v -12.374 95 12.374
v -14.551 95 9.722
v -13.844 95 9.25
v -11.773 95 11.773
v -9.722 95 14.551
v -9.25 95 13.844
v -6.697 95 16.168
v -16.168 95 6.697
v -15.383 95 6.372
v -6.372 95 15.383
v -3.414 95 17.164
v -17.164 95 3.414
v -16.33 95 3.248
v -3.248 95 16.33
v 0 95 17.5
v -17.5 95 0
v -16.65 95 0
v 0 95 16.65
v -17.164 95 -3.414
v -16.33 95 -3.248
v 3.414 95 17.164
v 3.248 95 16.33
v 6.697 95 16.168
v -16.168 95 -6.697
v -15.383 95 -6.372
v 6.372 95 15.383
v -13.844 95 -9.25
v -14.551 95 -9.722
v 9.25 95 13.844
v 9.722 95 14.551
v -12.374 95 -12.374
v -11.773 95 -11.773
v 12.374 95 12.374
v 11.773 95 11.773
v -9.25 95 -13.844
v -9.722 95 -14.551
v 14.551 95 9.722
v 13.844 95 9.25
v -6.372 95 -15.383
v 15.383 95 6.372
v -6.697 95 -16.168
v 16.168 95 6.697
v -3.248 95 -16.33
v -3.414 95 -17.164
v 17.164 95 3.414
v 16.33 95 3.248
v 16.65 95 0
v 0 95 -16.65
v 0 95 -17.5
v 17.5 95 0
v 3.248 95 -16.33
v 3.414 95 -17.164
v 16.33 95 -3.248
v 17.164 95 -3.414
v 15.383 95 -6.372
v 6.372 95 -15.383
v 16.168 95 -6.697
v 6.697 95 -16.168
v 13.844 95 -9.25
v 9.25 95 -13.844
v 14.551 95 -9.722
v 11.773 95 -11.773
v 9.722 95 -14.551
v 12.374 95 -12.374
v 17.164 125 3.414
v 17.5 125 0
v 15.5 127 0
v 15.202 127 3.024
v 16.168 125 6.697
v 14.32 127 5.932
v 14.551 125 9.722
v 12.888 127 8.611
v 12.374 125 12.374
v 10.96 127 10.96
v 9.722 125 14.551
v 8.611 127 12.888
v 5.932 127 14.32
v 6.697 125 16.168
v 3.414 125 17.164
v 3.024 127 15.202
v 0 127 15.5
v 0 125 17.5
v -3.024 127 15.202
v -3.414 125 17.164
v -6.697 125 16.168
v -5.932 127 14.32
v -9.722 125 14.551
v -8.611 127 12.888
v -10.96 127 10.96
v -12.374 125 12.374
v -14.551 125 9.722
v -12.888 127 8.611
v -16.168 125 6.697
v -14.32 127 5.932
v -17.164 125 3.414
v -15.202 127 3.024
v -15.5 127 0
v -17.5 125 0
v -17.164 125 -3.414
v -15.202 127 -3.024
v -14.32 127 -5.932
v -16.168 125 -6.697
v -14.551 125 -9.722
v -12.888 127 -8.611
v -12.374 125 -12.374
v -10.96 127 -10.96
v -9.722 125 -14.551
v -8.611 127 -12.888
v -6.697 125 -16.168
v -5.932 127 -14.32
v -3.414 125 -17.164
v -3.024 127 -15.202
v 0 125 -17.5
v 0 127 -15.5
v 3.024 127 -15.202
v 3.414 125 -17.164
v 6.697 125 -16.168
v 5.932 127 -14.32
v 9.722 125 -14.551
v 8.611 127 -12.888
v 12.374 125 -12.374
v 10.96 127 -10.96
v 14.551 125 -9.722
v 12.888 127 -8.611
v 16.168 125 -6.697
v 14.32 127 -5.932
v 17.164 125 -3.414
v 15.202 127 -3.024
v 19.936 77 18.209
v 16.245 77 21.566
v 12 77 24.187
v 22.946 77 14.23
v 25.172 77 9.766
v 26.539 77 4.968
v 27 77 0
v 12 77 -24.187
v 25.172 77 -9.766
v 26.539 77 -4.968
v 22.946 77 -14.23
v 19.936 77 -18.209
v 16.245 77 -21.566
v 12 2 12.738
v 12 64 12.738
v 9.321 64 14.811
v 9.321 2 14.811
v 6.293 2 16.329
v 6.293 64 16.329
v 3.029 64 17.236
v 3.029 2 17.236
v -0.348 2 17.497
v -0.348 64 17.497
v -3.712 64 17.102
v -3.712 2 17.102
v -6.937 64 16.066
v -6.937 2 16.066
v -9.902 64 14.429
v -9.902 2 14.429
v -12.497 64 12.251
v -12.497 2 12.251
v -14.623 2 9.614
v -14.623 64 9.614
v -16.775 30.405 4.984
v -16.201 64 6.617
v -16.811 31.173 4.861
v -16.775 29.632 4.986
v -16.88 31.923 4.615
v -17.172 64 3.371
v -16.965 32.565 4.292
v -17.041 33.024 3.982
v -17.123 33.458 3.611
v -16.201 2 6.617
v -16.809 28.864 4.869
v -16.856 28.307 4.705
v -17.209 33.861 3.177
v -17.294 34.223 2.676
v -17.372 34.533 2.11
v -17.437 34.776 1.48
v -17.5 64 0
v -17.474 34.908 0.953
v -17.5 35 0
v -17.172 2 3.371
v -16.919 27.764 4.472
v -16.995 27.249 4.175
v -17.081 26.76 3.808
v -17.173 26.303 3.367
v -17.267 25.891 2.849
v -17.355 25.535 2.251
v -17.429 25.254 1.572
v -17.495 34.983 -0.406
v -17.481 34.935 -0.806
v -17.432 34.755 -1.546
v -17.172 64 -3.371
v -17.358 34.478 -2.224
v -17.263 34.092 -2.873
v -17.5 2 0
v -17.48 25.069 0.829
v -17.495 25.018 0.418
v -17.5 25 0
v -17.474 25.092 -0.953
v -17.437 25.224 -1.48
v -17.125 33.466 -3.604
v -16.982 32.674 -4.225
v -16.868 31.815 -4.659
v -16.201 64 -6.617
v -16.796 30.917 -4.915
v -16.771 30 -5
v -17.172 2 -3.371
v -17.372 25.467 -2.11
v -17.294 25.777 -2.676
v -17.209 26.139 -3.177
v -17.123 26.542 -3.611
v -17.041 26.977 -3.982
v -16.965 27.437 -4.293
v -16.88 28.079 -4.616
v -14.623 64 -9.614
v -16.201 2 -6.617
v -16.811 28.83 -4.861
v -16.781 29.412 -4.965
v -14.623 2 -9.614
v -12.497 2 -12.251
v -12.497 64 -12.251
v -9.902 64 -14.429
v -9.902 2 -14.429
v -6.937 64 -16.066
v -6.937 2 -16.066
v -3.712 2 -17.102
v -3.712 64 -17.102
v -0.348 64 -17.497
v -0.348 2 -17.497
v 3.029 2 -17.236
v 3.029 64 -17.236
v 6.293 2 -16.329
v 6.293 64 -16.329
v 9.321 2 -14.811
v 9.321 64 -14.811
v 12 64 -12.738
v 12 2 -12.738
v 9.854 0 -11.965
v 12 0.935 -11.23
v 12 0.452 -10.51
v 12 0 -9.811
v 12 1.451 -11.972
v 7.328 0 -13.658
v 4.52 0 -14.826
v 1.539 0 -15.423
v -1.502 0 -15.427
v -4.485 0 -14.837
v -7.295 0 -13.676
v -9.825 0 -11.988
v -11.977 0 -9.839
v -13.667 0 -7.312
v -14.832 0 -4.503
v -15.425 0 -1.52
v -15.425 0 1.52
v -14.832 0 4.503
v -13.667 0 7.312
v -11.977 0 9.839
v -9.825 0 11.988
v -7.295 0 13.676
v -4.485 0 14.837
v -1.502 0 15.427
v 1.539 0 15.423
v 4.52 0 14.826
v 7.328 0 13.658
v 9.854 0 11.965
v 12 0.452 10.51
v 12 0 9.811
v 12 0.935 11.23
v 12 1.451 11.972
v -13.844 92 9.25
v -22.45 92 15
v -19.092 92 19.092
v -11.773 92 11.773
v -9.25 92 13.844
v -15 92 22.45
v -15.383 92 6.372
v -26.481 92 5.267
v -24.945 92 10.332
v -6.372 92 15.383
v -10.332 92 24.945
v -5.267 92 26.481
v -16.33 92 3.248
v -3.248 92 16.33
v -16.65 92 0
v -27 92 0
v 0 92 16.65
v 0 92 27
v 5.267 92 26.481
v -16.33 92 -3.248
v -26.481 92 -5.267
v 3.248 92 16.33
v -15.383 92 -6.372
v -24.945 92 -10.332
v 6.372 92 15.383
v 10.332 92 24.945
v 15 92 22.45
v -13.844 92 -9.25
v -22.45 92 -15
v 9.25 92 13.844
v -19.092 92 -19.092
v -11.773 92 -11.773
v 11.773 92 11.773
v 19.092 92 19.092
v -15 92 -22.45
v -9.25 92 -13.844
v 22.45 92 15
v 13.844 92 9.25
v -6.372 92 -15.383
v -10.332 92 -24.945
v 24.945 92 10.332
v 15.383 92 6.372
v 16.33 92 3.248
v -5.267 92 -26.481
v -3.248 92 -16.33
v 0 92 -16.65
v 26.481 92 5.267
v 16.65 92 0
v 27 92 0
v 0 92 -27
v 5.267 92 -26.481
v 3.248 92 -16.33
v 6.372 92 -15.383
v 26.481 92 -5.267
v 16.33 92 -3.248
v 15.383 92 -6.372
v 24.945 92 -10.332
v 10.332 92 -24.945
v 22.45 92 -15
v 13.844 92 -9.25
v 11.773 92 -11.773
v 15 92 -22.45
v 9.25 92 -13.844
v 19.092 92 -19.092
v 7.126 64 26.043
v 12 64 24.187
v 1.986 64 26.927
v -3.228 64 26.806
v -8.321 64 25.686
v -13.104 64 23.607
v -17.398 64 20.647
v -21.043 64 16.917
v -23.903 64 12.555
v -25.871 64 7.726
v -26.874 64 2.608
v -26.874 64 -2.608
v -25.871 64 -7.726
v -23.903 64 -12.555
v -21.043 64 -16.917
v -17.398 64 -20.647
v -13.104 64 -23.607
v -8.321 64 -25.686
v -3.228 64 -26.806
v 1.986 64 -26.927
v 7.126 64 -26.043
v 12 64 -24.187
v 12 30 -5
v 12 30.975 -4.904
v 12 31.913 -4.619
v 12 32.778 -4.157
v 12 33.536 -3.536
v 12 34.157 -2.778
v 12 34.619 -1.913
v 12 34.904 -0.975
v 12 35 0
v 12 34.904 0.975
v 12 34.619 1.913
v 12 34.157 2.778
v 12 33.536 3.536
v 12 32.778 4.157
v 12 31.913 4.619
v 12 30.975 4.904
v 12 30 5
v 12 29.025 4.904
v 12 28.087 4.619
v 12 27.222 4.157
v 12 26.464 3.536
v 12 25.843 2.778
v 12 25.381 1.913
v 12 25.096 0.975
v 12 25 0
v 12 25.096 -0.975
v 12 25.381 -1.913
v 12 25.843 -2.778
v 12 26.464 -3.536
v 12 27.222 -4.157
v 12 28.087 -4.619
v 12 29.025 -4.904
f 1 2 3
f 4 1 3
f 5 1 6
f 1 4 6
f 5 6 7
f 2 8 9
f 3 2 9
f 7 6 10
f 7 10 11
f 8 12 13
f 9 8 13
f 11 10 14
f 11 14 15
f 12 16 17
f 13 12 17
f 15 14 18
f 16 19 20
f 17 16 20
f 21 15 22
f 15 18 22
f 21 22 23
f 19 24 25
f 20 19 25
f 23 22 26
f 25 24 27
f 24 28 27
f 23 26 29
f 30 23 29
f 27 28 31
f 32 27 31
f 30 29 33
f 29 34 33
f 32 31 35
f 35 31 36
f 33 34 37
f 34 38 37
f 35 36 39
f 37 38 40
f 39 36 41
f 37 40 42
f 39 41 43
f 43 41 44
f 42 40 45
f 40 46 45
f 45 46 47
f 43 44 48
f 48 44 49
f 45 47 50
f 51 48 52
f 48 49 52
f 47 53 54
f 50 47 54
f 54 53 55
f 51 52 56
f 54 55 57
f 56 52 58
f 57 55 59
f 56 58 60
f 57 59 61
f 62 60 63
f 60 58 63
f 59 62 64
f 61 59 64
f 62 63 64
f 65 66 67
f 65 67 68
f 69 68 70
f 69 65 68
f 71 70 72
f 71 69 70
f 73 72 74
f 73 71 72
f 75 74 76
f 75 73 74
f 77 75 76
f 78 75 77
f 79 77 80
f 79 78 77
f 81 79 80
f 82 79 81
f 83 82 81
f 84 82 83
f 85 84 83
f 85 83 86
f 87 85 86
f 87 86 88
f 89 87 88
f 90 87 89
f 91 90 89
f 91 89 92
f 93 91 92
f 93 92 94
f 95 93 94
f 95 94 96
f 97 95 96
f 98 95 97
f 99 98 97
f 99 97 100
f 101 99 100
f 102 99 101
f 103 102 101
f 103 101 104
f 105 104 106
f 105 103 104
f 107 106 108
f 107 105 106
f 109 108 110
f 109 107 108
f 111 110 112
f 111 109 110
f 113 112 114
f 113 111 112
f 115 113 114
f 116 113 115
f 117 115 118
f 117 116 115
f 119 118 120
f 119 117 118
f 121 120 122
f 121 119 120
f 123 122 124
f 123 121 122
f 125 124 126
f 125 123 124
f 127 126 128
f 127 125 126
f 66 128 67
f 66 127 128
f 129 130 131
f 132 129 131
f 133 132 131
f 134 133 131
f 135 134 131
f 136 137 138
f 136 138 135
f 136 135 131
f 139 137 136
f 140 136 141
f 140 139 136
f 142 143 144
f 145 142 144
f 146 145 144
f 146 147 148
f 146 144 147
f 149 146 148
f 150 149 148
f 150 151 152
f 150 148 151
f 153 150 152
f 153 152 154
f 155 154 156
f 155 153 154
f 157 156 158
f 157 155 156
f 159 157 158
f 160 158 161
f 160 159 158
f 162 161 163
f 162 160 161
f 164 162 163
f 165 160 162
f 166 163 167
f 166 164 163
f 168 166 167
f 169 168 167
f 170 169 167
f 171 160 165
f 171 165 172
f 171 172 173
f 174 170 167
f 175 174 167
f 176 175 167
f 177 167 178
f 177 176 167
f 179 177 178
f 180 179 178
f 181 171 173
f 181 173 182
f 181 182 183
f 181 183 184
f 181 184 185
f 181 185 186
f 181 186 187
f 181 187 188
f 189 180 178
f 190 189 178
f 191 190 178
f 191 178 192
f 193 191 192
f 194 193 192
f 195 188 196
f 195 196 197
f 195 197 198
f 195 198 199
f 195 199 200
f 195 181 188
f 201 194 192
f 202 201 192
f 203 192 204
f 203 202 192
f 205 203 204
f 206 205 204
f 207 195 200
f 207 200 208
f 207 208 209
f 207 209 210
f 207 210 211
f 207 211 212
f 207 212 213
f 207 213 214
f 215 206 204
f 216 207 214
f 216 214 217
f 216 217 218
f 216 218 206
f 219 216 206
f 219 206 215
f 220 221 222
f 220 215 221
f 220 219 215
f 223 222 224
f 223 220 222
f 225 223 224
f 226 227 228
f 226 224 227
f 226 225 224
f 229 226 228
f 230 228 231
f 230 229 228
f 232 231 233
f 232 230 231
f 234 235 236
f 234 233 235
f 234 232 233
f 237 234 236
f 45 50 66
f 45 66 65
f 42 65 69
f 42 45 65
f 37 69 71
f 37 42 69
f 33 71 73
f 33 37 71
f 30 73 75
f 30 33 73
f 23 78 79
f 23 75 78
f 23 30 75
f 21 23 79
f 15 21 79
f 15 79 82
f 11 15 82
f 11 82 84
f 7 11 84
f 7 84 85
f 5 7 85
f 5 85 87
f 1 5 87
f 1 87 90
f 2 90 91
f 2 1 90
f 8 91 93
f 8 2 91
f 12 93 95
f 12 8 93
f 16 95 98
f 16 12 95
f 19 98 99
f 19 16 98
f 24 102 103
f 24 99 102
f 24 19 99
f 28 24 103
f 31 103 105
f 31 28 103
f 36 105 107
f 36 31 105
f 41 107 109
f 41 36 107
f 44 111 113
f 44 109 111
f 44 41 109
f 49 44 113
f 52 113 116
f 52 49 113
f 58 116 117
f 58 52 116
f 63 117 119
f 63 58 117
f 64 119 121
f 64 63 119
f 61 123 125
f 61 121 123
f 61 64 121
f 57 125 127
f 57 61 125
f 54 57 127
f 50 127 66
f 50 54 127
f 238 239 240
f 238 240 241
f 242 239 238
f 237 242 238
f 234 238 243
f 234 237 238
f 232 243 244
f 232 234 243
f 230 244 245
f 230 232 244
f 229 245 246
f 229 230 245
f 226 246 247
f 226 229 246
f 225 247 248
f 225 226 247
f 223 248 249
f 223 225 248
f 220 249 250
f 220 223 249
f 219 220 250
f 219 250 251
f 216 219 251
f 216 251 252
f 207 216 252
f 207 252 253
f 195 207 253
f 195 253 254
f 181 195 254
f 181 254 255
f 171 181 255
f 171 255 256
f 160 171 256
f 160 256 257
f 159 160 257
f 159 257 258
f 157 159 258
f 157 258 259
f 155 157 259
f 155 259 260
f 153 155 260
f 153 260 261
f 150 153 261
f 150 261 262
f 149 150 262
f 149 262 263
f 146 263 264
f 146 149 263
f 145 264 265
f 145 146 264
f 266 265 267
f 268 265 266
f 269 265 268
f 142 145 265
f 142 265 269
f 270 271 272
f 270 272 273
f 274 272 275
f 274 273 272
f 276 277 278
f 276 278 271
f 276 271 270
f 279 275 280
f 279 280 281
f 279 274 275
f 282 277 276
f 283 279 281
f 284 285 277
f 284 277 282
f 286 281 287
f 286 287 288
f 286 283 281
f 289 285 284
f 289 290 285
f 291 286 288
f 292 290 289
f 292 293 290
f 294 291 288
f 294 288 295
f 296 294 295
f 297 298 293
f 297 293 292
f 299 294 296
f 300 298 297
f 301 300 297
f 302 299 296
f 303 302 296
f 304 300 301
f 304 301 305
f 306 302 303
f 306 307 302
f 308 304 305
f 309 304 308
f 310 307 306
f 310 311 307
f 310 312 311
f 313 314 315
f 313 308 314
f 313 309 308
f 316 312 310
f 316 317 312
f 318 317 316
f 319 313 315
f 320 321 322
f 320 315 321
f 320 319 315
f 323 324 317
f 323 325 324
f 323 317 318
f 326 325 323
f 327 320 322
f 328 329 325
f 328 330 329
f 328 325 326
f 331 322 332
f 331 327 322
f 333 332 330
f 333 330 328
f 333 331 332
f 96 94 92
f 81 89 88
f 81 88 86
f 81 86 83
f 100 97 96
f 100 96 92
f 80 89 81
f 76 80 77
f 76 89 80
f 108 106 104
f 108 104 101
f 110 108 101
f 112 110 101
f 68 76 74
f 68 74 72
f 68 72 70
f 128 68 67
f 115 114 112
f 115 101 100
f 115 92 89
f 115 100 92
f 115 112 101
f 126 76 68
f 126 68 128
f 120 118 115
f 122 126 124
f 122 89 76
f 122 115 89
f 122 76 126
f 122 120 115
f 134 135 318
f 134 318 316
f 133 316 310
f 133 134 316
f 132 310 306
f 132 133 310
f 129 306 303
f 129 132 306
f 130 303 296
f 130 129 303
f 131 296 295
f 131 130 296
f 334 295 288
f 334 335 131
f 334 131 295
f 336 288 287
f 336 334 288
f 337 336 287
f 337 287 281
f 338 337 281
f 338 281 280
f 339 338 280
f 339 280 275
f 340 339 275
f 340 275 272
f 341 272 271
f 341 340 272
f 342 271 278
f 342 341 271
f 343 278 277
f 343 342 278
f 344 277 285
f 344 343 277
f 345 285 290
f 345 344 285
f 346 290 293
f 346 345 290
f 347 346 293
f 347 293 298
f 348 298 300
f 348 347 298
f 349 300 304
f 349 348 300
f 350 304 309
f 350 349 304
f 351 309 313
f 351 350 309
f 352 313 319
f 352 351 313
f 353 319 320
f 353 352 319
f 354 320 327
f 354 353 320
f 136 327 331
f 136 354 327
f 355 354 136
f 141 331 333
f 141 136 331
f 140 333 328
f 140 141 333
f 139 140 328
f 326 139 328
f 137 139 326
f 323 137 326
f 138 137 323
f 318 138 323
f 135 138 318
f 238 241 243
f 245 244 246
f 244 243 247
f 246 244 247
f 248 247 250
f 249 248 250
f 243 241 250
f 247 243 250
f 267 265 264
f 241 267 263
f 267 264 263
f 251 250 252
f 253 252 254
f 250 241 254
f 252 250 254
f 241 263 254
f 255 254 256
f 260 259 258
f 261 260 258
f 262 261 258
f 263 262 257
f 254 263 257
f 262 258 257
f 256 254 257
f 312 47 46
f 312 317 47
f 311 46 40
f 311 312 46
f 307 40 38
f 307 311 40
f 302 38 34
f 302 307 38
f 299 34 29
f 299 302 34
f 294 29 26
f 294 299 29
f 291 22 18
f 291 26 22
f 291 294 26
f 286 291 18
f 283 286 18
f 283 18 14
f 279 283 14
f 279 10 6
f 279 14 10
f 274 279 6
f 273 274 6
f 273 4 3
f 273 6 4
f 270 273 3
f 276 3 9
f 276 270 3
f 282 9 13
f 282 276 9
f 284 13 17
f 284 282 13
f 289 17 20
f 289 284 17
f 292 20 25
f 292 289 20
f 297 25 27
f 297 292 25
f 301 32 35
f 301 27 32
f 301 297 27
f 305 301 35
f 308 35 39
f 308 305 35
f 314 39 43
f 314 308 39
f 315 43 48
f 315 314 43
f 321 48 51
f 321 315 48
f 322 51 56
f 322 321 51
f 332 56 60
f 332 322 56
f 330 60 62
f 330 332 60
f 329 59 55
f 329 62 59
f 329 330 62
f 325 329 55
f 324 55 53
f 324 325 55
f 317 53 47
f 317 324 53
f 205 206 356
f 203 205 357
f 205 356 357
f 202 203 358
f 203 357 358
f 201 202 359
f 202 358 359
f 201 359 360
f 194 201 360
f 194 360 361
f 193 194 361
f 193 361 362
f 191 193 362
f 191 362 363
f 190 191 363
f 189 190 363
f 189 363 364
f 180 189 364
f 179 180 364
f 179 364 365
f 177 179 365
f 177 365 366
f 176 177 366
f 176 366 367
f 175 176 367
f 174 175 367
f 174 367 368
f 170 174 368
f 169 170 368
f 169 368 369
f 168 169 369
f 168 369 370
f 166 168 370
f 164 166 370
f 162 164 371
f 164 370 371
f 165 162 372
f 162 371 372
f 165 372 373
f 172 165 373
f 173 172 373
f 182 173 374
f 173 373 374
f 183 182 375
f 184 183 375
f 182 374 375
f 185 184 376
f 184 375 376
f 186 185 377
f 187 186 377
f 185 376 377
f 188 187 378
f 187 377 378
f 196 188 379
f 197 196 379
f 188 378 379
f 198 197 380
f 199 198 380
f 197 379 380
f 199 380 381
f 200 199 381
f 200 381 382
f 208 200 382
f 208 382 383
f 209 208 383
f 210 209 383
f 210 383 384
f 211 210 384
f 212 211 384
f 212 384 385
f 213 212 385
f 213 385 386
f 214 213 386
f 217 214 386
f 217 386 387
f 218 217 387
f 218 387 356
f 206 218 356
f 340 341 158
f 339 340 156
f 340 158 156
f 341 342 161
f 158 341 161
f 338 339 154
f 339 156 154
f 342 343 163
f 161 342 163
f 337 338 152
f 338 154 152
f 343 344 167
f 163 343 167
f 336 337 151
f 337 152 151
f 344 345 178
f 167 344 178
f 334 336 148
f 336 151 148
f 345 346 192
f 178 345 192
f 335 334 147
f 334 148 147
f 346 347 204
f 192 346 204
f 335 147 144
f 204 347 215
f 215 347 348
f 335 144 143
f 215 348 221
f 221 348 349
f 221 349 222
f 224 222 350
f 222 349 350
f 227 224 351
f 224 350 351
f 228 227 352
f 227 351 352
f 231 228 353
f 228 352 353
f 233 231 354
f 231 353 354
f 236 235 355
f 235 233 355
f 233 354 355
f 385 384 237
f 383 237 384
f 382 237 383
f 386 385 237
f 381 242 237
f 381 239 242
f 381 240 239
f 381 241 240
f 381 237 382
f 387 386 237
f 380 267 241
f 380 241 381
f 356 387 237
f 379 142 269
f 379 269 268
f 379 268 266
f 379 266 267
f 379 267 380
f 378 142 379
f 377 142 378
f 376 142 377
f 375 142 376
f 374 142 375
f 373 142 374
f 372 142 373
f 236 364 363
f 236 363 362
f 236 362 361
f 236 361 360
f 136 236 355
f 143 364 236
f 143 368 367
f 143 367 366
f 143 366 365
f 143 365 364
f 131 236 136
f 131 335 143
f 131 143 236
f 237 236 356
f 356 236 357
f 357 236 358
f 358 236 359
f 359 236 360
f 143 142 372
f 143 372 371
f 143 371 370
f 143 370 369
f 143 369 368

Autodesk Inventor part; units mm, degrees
ref_plane "XZ Plane" through (0, 0, 0) normal (0, 1, 0) x (-1, 0, 0)
ref_plane "XY Plane" through (0, 0, 0) normal (0, 0, 1) x (1, 0, 0)
sketch "Sketch1" plane through (0, 0, 0) normal (0, 1, 0) x (-1, 0, 0)
  circle A0 centre (0, 0) radius 17.5
  dimension "d0" = 35
extrude "Extrusion1" add sketch "Sketch1" along normal blind 64
sketch "Sketch2" plane through (0, 64, 0) normal (0, 1, 0) x (1, 0, 0)
  circle A0 centre (0, 0) radius 27
  dimension "d3" = 54
extrude "Extrusion2" add sketch "Sketch2" along normal blind 28
sketch "Sketch3" plane through (0, 92, 0) normal (0, 1, 0) x (1, 0, 0)
  circle A0 centre (0, 0) radius 16.65
  dimension "d6" = 33.3
extrude "Extrusion3" add sketch "Sketch3" along normal blind 3
sketch "Sketch4" plane through (0, 95, 0) normal (0, 1, 0) x (1, 0, 0)
  circle A0 centre (0, 0) radius 16.65 projected
  circle A1 centre (0, 0) radius 17.5
  dimension "d9" = 35
extrude "Extrusion4" add sketch "Sketch4" along normal blind 32 contours A0 | A1
ref_plane "Work Plane1" through (27, 64, 0) normal (1, 0, 0) x (0, 1, 0)
sketch "Sketch5" plane through (27, 64, 0) normal (1, 0, 0) x (0, 1, 0)
  line L0 (-64, -17.5) -> (-64, 17.5) projected
  line L1 (-64, -17.5) -> (-64, -50.6158)
  line L2 (-64, -50.6158) -> (13, -50.6158)
  line L3 (13, -50.6158) -> (-82.5223, -50.6158)
  line L4 (-82.5223, -50.6158) -> (-82.5223, 53.8814)
  line L5 (-82.5223, 53.8814) -> (13, 53.8814)
  line L6 (13, 53.8814) -> (13, -50.6158)
  point P0 (-64, 0)
  dimension "d12" = 77
extrude "Extrusion5" cut sketch "Sketch5" against normal blind 15
sketch "Sketch6" plane through (12, 64, 0) normal (1, 0, 0) x (0, 0, -1)
  line L0 (17.5, -64) -> (-17.5, -64) projected
  line L1 (-17.5, -64) -> (0, -64)
  line L2 (0, -64) -> (0, -34)
  line L3 (0, -34) -> (-17.5, -34)
  line L4 (-17.5, -34) -> (-17.5, -64)
  circle A0 centre (0, -34) radius 5
  point P0 (12.7377, -64)
  point P1 (-12.7377, -64)
  dimension "d15" = 30
  dimension "d16" = 10
extrude "Extrusion6" cut sketch "Sketch6" against normal through all contours A0 L3 L2 | L2 L3 A0
chamfer "Chamfer1" distance 2 angle 45 2 edges at (-17.5, 0, 0) (-17.5, 127, 0)
properties part number "MMAE 232 Assignment 1c-Nicholas Skiba" material "Aluminum 6061"
